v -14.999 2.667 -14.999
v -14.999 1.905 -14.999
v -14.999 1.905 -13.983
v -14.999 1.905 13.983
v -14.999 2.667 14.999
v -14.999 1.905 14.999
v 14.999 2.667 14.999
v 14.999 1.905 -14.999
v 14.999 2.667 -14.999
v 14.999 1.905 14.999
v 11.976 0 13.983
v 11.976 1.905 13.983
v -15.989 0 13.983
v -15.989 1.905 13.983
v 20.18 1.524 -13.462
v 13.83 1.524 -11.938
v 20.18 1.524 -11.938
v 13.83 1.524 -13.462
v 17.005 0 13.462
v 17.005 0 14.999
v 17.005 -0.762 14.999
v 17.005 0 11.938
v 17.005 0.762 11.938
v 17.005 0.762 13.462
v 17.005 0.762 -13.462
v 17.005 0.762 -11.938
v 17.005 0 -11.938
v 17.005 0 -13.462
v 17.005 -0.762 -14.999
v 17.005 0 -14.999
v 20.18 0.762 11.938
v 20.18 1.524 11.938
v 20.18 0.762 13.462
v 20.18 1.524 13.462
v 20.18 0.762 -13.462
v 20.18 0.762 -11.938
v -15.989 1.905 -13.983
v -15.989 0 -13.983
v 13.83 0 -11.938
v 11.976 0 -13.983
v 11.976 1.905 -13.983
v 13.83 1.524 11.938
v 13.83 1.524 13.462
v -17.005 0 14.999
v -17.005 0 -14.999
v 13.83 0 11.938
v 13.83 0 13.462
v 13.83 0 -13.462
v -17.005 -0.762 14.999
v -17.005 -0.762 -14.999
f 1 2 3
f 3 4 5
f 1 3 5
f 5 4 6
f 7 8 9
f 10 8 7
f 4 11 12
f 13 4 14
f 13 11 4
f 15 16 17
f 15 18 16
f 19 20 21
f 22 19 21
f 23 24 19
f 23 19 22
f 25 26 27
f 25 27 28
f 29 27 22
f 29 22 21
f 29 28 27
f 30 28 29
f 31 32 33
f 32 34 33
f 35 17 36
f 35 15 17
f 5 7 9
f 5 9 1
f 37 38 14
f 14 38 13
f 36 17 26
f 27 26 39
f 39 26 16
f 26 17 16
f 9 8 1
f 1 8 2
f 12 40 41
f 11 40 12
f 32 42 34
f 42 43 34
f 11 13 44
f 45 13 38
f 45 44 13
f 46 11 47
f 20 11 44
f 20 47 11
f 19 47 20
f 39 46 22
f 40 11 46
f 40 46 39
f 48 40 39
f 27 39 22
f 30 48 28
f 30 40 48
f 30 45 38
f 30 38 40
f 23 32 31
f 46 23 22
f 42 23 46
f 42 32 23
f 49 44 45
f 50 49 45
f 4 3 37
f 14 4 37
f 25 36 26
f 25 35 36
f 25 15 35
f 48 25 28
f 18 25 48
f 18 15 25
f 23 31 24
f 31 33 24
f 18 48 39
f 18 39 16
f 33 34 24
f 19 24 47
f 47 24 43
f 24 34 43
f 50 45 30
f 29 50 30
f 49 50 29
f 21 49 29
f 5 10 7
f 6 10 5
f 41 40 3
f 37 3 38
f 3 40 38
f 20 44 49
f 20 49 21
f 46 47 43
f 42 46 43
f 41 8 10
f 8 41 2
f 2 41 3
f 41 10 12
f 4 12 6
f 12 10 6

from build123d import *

# Parameters (mm, degrees)
SKETCH1_W      = 34.0106
SKETCH1_H      = 29.9974
EXTRUDE1_DEPTH = 0.762
SKETCH2_W      = 27.9654
SKETCH2_H      = 27.9654
EXTRUDE2_DEPTH = 1.905
SKETCH3_W      = 29.9974
SKETCH3_H      = 29.9974
EXTRUDE3_DEPTH = 0.762
EXTRUDE4_START = 12.7
EXTRUDE4_DEPTH = 0.762


with BuildPart() as part:
    # Sketch1 → Extrude1 (new body)
    with BuildSketch(Plane(origin=(0, 0, 0), x_dir=(1, 0, 0), z_dir=(0, 1, 0))):
        Rectangle(SKETCH1_W, SKETCH1_H)
    extrude(amount=-EXTRUDE1_DEPTH)

    # Sketch2 → Extrude2 (add)
    with BuildSketch(Plane(origin=(0, 0, 0), x_dir=(-1, 0, 0), z_dir=(0, 1, 0))):
        with Locations((2.0066, 0)):
            Rectangle(SKETCH2_W, SKETCH2_H)
    extrude(amount=EXTRUDE2_DEPTH)

    # Sketch3 → Extrude3 (add)
    with BuildSketch(Plane(origin=(0, 1.905, 0), x_dir=(-1, 0, 0), z_dir=(0, 1, 0))):
        Rectangle(SKETCH3_W, SKETCH3_H)
    extrude(amount=EXTRUDE3_DEPTH)

    # Sketch4 → Extrude4 (add, symmetric)
    with BuildSketch(Plane.XY.offset(EXTRUDE4_START)):
        Polygon((13.8303, 0), (13.8303, 1.524), (20.1803, 1.524), (20.1803, 0.762), (17.0053, 0.762), (17.0053, 0), align=None)
    extrude4 = extrude(amount=EXTRUDE4_DEPTH, both=True)

    # Mirror1: Extrude4 across plane
    add(extrude4.mirror(Plane.XY))


solid = part.part
